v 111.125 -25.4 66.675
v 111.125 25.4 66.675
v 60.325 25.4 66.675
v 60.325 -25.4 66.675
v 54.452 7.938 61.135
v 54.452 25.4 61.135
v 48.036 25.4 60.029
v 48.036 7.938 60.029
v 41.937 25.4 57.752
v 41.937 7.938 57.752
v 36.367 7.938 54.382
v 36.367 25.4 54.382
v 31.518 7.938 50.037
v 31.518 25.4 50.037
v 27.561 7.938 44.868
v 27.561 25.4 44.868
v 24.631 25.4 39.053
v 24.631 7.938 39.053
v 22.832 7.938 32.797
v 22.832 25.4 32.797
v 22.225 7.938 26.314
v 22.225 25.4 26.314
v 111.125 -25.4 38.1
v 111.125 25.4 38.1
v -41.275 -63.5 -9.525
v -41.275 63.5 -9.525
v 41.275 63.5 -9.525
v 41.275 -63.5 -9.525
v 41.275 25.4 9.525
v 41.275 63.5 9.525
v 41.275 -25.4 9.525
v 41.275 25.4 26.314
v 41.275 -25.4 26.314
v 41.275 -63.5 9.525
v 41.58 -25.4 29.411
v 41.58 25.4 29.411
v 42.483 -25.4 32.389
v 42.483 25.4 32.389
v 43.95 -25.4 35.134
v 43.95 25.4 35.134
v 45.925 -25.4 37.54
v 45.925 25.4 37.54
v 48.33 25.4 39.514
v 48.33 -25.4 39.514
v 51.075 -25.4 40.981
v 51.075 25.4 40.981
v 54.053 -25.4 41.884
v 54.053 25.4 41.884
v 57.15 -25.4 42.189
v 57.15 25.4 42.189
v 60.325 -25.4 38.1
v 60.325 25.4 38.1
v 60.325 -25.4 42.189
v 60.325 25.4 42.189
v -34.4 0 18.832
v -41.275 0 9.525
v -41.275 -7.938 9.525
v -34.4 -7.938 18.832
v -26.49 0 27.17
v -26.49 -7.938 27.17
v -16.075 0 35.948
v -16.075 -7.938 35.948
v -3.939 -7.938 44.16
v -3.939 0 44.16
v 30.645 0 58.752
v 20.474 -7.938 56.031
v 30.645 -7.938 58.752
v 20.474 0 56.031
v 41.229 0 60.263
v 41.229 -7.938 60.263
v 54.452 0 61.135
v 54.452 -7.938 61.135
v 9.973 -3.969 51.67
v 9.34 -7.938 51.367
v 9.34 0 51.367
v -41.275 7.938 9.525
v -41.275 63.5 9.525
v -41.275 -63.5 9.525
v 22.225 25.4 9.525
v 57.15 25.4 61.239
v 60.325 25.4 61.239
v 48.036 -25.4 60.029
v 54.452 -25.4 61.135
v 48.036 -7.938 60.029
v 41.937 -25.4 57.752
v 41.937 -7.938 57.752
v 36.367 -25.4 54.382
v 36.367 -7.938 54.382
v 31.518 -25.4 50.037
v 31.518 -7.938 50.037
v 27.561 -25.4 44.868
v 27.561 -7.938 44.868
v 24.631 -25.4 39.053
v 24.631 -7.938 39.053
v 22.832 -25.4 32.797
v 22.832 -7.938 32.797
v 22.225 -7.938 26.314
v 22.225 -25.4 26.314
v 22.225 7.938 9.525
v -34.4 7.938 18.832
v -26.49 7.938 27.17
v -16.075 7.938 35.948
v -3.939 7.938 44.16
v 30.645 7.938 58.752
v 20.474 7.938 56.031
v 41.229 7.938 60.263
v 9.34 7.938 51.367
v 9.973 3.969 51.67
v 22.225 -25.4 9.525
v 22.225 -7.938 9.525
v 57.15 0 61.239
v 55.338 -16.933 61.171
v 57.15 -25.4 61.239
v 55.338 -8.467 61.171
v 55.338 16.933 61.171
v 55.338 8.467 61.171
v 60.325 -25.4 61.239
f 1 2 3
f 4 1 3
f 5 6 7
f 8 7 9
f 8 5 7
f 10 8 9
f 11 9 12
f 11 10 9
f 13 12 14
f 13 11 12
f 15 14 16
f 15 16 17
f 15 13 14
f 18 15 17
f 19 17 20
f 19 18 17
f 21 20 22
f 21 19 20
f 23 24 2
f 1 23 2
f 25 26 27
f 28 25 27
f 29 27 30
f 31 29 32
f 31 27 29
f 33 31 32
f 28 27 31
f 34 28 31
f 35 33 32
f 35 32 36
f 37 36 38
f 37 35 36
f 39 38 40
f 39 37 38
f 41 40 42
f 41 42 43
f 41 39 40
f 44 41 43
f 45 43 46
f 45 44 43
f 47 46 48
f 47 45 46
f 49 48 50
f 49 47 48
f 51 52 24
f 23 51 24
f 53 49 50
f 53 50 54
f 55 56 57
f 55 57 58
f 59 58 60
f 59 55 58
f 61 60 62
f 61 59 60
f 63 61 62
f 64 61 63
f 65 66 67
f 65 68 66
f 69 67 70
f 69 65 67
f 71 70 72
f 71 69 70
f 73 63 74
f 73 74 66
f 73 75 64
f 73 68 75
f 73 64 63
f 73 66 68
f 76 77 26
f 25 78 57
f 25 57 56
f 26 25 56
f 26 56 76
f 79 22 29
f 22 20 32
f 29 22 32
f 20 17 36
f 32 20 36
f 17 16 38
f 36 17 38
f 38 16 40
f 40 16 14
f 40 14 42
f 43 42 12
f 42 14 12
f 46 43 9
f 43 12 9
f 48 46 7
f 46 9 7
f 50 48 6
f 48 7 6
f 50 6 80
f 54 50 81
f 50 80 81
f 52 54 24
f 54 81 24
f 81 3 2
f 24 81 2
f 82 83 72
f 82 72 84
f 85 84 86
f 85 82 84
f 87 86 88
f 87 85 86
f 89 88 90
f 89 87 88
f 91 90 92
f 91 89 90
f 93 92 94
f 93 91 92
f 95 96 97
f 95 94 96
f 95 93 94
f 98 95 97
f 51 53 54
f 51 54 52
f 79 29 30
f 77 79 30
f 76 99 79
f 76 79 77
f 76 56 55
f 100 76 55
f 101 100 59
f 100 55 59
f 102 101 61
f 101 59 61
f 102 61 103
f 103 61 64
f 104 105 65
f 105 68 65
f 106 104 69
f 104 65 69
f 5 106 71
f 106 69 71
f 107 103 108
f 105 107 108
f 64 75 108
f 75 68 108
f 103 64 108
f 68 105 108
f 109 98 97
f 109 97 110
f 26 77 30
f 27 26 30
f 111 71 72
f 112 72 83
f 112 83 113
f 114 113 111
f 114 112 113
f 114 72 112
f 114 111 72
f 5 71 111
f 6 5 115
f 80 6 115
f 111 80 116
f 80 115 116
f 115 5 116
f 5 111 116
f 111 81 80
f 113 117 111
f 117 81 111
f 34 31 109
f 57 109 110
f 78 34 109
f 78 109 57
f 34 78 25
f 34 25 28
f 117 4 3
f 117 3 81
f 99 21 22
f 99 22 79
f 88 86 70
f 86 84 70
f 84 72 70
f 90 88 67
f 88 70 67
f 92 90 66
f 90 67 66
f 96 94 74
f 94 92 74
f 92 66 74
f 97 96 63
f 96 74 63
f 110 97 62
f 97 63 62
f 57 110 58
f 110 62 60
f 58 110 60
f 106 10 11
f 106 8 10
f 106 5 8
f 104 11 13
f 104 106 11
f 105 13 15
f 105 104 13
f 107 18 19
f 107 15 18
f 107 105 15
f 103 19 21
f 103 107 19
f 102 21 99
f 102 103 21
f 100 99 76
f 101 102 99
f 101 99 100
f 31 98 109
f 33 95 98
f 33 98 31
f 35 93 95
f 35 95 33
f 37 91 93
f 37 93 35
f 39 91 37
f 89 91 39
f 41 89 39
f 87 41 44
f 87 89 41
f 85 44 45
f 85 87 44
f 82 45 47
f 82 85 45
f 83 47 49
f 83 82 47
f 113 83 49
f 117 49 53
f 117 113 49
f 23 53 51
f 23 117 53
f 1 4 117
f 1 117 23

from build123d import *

# Parameters (mm, degrees)
F1_DEPTH = 63.5
F2_DEPTH = 25.4
F3_DEPTH = 7.9375


with BuildPart() as f1:
    # F0 (on Front) → F1 (new body, symmetric)
    with BuildSketch(Plane.XZ):
        Polygon((-41.275, 9.525), (-41.275, -9.525), (41.275, -9.525), (41.275, 9.525), (22.225, 9.525), align=None)
    extrude(amount=F1_DEPTH, both=True)

    # F0 (on Front) → F2 (join, symmetric)
    with BuildSketch(Plane.XZ):
        with BuildLine():
            Line((22.225, 9.525), (41.275, 9.525))
            Line((41.275, 9.525), (41.275, 26.3144))
            ThreePointArc((41.275, 26.3144), (45.9246798487, 37.5397201513), (57.15, 42.1894))
            Line((57.15, 42.1894), (60.325, 42.1894))
            Line((60.325, 42.1894), (60.325, 61.2394))
            Line((60.325, 61.2394), (57.15, 61.2394))
            add(Edge.make_bspline(
                [(54.4521083612, 61.1350405126), (55.3312639193, 61.1719383272), (56.2302041727, 61.2066578487), (57.15, 61.2394)],
                knots=[0.9818500248, 0.9818500248, 0.9818500248, 0.9818500248, 1, 1, 1, 1], degree=3))
            ThreePointArc((54.4521083612, 61.1350405126), (31.5181888029, 50.0370870265), (22.225, 26.3144))
            Line((22.225, 26.3144), (22.225, 9.525))
        make_face()
        Polygon((60.325, 66.675), (60.325, 61.2394), (60.325, 42.1894), (60.325, 38.1), (111.125, 38.1), (111.125, 66.675), align=None)
    extrude(amount=F2_DEPTH, both=True)

    # F0 (on Front) → F3 (join, symmetric)
    with BuildSketch(Plane.XZ):
        with BuildLine():
            add(Edge.make_bspline(
                [(-41.275, 9.525), (-28.348620981, 29.8197139055), (11.5454759395, 55.3722683758), (33.0508519988, 60.2368381598), (54.4521083612, 61.1350405126)],
                knots=[0, 0, 0, 0, 0.540025743, 0.9818500248, 0.9818500248, 0.9818500248, 0.9818500248], degree=3))
            Line((-41.275, 9.525), (22.225, 9.525))
            Line((22.225, 9.525), (22.225, 26.3144))
            ThreePointArc((22.225, 26.3144), (31.5181888029, 50.0370870265), (54.4521083612, 61.1350405126))
        make_face()
    extrude(amount=F3_DEPTH, both=True)


solid = f1.part
